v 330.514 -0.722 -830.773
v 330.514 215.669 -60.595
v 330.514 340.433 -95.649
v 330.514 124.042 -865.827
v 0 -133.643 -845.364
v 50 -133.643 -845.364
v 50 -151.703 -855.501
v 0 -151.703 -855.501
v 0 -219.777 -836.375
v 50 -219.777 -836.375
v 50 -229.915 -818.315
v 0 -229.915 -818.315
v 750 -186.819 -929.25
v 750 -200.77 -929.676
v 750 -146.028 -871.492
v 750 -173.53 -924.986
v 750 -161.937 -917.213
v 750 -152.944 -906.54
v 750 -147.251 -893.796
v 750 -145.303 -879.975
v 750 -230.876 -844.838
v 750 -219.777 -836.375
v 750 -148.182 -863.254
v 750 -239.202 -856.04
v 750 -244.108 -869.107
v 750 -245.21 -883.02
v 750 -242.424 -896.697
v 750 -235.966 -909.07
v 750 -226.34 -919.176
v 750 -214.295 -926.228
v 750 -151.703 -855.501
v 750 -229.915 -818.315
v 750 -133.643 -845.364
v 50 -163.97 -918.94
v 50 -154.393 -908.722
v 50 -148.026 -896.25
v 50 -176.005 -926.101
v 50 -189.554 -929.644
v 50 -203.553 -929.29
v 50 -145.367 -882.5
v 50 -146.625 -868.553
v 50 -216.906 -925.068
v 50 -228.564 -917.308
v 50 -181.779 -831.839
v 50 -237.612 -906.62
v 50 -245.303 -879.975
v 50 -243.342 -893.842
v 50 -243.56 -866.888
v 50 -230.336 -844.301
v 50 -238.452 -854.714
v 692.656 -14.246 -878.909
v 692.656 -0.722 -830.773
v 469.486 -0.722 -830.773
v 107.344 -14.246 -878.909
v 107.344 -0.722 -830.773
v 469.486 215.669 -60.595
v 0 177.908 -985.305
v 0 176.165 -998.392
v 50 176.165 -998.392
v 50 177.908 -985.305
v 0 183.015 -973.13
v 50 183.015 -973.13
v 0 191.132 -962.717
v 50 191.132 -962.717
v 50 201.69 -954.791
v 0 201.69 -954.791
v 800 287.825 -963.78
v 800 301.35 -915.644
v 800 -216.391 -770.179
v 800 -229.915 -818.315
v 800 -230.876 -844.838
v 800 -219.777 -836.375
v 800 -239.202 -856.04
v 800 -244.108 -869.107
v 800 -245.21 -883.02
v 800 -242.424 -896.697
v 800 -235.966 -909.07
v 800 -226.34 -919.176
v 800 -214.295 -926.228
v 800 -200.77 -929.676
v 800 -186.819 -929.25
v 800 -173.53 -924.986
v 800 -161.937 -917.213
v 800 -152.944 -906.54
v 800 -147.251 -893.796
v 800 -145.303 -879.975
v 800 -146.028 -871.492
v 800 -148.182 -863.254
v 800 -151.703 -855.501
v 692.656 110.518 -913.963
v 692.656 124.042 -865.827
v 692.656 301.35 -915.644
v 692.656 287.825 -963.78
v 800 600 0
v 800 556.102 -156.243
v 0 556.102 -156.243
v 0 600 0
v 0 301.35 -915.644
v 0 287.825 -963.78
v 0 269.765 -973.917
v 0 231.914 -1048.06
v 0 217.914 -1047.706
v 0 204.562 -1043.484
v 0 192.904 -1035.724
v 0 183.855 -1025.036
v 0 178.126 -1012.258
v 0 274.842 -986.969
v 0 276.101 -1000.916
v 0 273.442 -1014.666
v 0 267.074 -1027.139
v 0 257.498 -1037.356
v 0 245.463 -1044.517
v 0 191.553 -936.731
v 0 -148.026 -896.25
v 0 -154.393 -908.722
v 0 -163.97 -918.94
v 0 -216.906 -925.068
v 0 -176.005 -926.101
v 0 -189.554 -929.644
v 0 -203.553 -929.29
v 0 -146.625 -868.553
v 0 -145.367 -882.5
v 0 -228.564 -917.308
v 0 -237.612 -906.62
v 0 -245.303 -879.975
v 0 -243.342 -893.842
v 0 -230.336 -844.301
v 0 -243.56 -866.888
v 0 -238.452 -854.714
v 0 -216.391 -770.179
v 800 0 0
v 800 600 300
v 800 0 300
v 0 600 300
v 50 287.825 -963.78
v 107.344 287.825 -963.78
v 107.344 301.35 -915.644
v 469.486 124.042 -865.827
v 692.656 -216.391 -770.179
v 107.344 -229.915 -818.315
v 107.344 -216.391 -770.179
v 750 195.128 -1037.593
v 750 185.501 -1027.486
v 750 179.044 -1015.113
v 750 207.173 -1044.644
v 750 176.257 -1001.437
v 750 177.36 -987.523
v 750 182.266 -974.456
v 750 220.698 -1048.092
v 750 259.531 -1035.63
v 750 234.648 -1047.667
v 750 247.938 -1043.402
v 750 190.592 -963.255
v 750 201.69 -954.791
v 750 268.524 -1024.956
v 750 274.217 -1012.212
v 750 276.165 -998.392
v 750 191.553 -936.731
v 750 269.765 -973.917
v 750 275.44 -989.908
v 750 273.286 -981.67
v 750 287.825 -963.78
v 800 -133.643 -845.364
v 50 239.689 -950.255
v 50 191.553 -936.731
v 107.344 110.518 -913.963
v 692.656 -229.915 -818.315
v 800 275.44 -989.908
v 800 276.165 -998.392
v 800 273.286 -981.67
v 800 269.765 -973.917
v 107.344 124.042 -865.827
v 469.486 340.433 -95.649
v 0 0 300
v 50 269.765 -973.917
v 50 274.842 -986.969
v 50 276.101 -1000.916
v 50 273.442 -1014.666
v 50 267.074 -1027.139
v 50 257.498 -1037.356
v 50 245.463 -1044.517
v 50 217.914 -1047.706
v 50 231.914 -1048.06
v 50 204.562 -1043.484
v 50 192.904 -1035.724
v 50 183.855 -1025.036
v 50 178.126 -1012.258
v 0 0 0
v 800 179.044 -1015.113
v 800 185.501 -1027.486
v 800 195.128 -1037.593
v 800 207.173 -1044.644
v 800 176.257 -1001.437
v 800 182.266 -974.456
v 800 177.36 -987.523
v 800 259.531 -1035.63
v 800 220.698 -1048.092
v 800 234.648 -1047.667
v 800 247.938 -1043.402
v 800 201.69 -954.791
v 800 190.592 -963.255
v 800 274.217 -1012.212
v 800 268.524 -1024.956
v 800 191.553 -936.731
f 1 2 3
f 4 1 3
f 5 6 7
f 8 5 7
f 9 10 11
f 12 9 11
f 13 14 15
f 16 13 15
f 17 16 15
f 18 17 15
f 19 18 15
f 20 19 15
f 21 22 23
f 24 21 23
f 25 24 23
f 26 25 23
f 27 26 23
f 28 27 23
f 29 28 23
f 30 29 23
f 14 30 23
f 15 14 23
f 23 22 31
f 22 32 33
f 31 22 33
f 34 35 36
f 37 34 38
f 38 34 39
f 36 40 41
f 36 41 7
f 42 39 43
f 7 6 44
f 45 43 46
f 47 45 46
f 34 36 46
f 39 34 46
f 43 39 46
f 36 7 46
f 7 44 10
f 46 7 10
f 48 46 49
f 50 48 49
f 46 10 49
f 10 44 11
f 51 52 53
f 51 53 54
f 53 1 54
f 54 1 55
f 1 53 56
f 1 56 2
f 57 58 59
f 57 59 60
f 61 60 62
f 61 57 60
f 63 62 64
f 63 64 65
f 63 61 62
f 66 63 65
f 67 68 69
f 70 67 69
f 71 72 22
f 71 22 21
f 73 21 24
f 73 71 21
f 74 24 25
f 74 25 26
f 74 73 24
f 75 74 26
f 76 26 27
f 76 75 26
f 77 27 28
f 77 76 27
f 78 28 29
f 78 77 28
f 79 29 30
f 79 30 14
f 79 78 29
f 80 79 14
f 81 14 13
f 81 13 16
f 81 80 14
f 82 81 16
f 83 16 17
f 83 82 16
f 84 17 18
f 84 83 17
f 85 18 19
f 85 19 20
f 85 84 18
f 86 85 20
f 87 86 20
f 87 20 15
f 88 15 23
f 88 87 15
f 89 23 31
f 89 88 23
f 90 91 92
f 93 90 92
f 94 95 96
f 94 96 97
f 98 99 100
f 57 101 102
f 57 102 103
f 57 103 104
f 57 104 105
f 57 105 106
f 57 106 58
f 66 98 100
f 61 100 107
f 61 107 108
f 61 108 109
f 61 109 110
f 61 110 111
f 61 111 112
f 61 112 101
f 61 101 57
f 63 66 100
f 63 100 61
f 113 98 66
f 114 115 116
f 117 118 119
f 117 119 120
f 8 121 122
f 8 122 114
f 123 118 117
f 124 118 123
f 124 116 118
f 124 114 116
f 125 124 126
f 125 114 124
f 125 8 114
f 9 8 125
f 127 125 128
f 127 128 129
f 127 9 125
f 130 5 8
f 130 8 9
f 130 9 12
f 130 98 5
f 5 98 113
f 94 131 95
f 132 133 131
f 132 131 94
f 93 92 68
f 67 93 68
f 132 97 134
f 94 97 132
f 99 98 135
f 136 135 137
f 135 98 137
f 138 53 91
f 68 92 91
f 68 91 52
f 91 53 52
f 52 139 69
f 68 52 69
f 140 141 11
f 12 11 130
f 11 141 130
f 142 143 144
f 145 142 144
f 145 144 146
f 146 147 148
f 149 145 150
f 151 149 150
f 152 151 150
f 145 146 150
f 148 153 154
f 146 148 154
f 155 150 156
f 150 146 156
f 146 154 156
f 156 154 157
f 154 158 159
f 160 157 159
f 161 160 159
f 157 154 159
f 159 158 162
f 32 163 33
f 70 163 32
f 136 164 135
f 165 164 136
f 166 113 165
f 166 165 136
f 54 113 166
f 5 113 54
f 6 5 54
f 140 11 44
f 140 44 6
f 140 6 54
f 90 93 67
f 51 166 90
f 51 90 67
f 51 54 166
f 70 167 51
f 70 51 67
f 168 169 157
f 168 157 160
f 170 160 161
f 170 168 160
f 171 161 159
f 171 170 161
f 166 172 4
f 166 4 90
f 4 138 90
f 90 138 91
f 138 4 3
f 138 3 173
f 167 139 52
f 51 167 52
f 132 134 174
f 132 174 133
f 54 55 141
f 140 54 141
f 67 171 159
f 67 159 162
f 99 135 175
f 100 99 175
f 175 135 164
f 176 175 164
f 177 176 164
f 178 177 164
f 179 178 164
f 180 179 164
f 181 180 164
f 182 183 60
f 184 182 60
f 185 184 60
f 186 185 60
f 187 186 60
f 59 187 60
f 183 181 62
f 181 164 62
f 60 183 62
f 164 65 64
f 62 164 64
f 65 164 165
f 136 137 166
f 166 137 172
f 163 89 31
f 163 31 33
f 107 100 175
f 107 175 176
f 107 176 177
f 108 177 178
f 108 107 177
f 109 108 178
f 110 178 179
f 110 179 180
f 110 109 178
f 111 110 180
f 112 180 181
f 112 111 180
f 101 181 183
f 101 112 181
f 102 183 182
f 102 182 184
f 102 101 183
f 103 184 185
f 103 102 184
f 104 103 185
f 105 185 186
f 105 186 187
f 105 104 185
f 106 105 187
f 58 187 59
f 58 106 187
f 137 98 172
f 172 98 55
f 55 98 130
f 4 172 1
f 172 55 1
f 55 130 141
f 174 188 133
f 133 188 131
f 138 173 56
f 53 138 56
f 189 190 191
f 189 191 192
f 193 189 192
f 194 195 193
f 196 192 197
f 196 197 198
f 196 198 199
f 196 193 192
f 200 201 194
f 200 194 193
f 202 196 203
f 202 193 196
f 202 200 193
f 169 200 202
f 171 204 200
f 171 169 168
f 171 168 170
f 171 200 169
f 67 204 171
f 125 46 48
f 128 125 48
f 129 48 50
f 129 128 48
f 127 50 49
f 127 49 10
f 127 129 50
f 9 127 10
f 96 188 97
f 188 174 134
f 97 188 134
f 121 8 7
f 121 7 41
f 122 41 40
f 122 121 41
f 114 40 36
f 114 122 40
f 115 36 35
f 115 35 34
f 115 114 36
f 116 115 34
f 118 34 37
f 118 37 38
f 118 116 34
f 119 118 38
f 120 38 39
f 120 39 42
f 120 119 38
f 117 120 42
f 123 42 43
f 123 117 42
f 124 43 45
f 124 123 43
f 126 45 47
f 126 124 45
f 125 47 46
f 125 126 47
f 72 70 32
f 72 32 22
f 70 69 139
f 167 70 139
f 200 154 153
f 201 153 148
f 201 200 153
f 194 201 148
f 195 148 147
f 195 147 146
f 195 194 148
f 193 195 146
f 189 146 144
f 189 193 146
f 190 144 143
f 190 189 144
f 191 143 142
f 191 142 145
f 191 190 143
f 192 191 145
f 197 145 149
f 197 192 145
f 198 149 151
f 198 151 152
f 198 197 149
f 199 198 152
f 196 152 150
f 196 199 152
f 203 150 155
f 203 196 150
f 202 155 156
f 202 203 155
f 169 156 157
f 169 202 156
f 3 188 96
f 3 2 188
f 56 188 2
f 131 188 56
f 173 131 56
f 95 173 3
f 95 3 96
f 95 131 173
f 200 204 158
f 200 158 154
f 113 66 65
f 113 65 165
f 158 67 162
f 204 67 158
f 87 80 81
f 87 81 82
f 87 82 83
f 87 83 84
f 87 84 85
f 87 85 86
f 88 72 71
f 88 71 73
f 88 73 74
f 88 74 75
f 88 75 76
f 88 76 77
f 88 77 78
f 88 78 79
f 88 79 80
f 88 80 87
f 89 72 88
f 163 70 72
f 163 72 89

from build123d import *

# Parameters (mm, degrees)
F0_W      = 800
F0_H      = 600
F1_DEPTH  = 300
F3_DEPTH  = 800
F4_W      = 69.4863438606
F4_H      = 64.7975049443
F5_DEPTH  = 800
F7_DEPTH  = 50
F9_DEPTH  = 50
F11_DEPTH = 50


with BuildPart() as f1:
    # F0 (on Top) → F1 (new body)
    with BuildSketch(Plane.XY):
        with Locations((400, 300)):
            Rectangle(F0_W, F0_H)
    extrude(amount=F1_DEPTH)

    # F2 (on face) → F3 (join)
    with BuildSketch(Plane.YZ.offset(800)):
        Polygon((600, 0), (0, 0), (556.1016824686, -156.2431702084), align=None)
    extrude(amount=-F3_DEPTH)

    # F4 (on face) → F5 (join)
    with BuildSketch(Plane(origin=(0, 0, 0), x_dir=(1, 0, 0), z_dir=(0, -0.270488193, -0.9627232923))):
        with Locations((365.2568280697, -256.4182352039)):
            Rectangle(F4_W, F4_H)
        with Locations((434.7431719303, -256.4182352039)):
            Rectangle(F4_W, F4_H)
        with Locations((434.7431719303, -321.2157401482)):
            Rectangle(F4_W, F4_H)
        with Locations((365.2568280697, -321.2157401482)):
            Rectangle(F4_W, F4_H)
    extrude(amount=F5_DEPTH)

    # F6 (on face) → F7 (join)
    with BuildSketch(Plane(origin=(0, -216.3905544, -770.1786338029), x_dir=(1, 0, 0), z_dir=(0, -0.270488193, -0.9627232923))):
        Polygon((107.3435395956, 0), (0, 0), (0, -537.7870798111), (107.3435395956, -537.7870798111), (107.3435395956, -353.6144926203), (330.5136561394, -353.6144926203), (400, -353.6144926203), (400, -224.0194827318), (330.5136561394, -224.0194827318), (107.3435395956, -224.0194827318), align=None)
        Polygon((469.4863438606, -224.0194827318), (400, -224.0194827318), (400, -353.6144926203), (469.4863438606, -353.6144926203), (692.6564604044, -353.6144926203), (692.6564604044, -537.7870798111), (800, -537.7870798111), (800, 0), (692.6564604044, 0), (692.6564604044, -224.0194827318), align=None)
    extrude(amount=F7_DEPTH)

    # F8 (on face) → F9 (join)
    with BuildSketch(Plane(origin=(0, 0, 0), x_dir=(0, -1, 0), z_dir=(-1, 0, 0))):
        with BuildLine():
            Line((219.7774157302, -836.3747624852), (229.91496405, -818.3147984155))
            Line((229.91496405, -818.3147984155), (181.7787994373, -831.8392080655))
            ThreePointArc((181.7787994373, -831.8392080655), (201.2291965173, -830.3277879134), (219.7774157302, -836.3747624852))
        make_face()
        with BuildLine():
            ThreePointArc((151.7025988943, -855.5011660354), (164.3873711275, -840.6789229246), (181.7787994373, -831.8392080655))
            Line((181.7787994373, -831.8392080655), (133.6426348247, -845.3636177156))
            Line((133.6426348247, -845.3636177156), (151.7025988943, -855.5011660354))
        make_face()
        with BuildLine():
            ThreePointArc((219.7774157302, -836.3747624852), (201.2291965173, -830.3277879134), (181.7787994373, -831.8392080655))
            Line((181.7787994373, -831.8392080655), (195.3032090873, -879.9753726782))
            Line((195.3032090873, -879.9753726782), (219.7774157302, -836.3747624852))
        make_face()
        with BuildLine():
            Line((195.3032090873, -879.9753726782), (181.7787994373, -831.8392080655))
            ThreePointArc((181.7787994373, -831.8392080655), (164.3873711275, -840.6789229246), (151.7025988943, -855.5011660354))
            Line((151.7025988943, -855.5011660354), (195.3032090873, -879.9753726782))
        make_face()
        with BuildLine():
            ThreePointArc((245.3032090873, -879.9753726782), (238.4524288494, -854.7138439452), (219.7774157302, -836.3747624852))
            Line((219.7774157302, -836.3747624852), (195.3032090873, -879.9753726782))
            Line((195.3032090873, -879.9753726782), (151.7025988943, -855.5011660354))
            ThreePointArc((151.7025988943, -855.5011660354), (182.6547014609, -928.3490768451), (245.3032090873, -879.9753726782))
        make_face()
        with BuildLine():
            Line((-239.6890150783, -950.2554430038), (-287.8251839572, -963.7798538524))
            Line((-287.8251839572, -963.7798538524), (-269.7652198875, -973.9174021722))
            ThreePointArc((-269.7652198875, -973.9174021722), (-257.0804459129, -959.0951576914), (-239.6890150783, -950.2554430038))
        make_face()
        with BuildLine():
            ThreePointArc((-239.6890150783, -950.2554430038), (-257.0804459129, -959.0951576914), (-269.7652198875, -973.9174021722))
            Line((-269.7652198875, -973.9174021722), (-226.1646096945, -998.3916088151))
            Line((-226.1646096945, -998.3916088151), (-201.6904030516, -954.7909986221))
            ThreePointArc((-201.6904030516, -954.7909986221), (-220.2386200645, -948.7440243129), (-239.6890150783, -950.2554430038))
        make_face()
        with BuildLine():
            Line((-226.1646096945, -998.3916088151), (-269.7652198875, -973.9174021722))
            ThreePointArc((-269.7652198875, -973.9174021722), (-238.8131173209, -1046.765312982), (-176.1646096945, -998.3916088151))
            ThreePointArc((-176.1646096945, -998.3916088151), (-183.0153899325, -973.1300800821), (-201.6904030516, -954.7909986221))
            Line((-201.6904030516, -954.7909986221), (-226.1646096945, -998.3916088151))
        make_face()
        with BuildLine():
            Line((-191.5528547318, -936.7310345524), (-239.6890150783, -950.2554430038))
            ThreePointArc((-239.6890150783, -950.2554430038), (-220.2386200645, -948.7440243129), (-201.6904030516, -954.7909986221))
            Line((-201.6904030516, -954.7909986221), (-191.5528547318, -936.7310345524))
        make_face()
    extrude(amount=-F9_DEPTH)


with BuildPart() as f11:
    # F10 (on face) → F11 (new body)
    with BuildSketch(Plane.YZ.offset(800)):
        with BuildLine():
            Line((269.7652198875, -973.9174021722), (287.8251839572, -963.7798538524))
            Line((287.8251839572, -963.7798538524), (239.6890193445, -950.2554442024))
            ThreePointArc((239.6890193445, -950.2554442024), (257.0804476543, -959.0951590614), (269.7652198875, -973.9174021722))
        make_face()
        with BuildLine():
            ThreePointArc((201.6904030516, -954.7909986221), (220.2386222645, -948.7440240503), (239.6890193445, -950.2554442024))
            Line((239.6890193445, -950.2554442024), (191.5528547318, -936.7310345524))
            Line((191.5528547318, -936.7310345524), (201.6904030516, -954.7909986221))
        make_face()
        with BuildLine():
            ThreePointArc((269.7652198875, -973.9174021722), (257.0804476543, -959.0951590614), (239.6890193445, -950.2554442024))
            Line((239.6890193445, -950.2554442024), (226.1646096945, -998.3916088151))
            Line((226.1646096945, -998.3916088151), (269.7652198875, -973.9174021722))
        make_face()
        with BuildLine():
            Line((226.1646096945, -998.3916088151), (239.6890193445, -950.2554442024))
            ThreePointArc((239.6890193445, -950.2554442024), (220.2386222645, -948.7440240503), (201.6904030516, -954.7909986221))
            Line((201.6904030516, -954.7909986221), (226.1646096945, -998.3916088151))
        make_face()
        with BuildLine():
            ThreePointArc((276.1646096945, -998.3916088151), (274.5383138614, -985.7431011887), (269.7652198875, -973.9174021722))
            Line((269.7652198875, -973.9174021722), (226.1646096945, -998.3916088151))
            Line((226.1646096945, -998.3916088151), (201.6904030516, -954.7909986221))
            ThreePointArc((201.6904030516, -954.7909986221), (200.9030809615, -1041.5408285771), (276.1646096945, -998.3916088151))
        make_face()
    extrude(amount=-F11_DEPTH)


with BuildPart() as f11b:
    # F10 (on face) → F11, piece 2 (new body)
    with BuildSketch(Plane.YZ.offset(800)):
        with BuildLine():
            ThreePointArc((-219.7774157302, -836.3747624852), (-220.5647378203, -923.1245924403), (-145.3032090873, -879.9753726782))
            ThreePointArc((-145.3032090873, -879.9753726782), (-146.9295049205, -867.3268650518), (-151.7025988943, -855.5011660354))
            Line((-151.7025988943, -855.5011660354), (-195.3032090873, -879.9753726782))
            Line((-195.3032090873, -879.9753726782), (-219.7774157302, -836.3747624852))
        make_face()
        with BuildLine():
            Line((-195.3032090873, -879.9753726782), (-151.7025988943, -855.5011660354))
            ThreePointArc((-151.7025988943, -855.5011660354), (-164.3873715072, -840.6789226258), (-181.7788003675, -831.8392078042))
            ThreePointArc((-181.7788003675, -831.8392078042), (-201.229196997, -830.3277879707), (-219.7774157302, -836.3747624852))
            Line((-219.7774157302, -836.3747624852), (-195.3032090873, -879.9753726782))
        make_face()
        with BuildLine():
            ThreePointArc((-181.7788003675, -831.8392078042), (-164.3873715072, -840.6789226258), (-151.7025988943, -855.5011660354))
            Line((-151.7025988943, -855.5011660354), (-133.6426348247, -845.3636177156))
            Line((-133.6426348247, -845.3636177156), (-181.7788003675, -831.8392078042))
        make_face()
        with BuildLine():
            Line((-229.91496405, -818.3147984155), (-219.7774157302, -836.3747624852))
            ThreePointArc((-219.7774157302, -836.3747624852), (-201.229196997, -830.3277879707), (-181.7788003675, -831.8392078042))
            Line((-181.7788003675, -831.8392078042), (-229.91496405, -818.3147984155))
        make_face()
    extrude(amount=-F11_DEPTH)


solid = Compound([f1.part, f11.part, f11b.part])
